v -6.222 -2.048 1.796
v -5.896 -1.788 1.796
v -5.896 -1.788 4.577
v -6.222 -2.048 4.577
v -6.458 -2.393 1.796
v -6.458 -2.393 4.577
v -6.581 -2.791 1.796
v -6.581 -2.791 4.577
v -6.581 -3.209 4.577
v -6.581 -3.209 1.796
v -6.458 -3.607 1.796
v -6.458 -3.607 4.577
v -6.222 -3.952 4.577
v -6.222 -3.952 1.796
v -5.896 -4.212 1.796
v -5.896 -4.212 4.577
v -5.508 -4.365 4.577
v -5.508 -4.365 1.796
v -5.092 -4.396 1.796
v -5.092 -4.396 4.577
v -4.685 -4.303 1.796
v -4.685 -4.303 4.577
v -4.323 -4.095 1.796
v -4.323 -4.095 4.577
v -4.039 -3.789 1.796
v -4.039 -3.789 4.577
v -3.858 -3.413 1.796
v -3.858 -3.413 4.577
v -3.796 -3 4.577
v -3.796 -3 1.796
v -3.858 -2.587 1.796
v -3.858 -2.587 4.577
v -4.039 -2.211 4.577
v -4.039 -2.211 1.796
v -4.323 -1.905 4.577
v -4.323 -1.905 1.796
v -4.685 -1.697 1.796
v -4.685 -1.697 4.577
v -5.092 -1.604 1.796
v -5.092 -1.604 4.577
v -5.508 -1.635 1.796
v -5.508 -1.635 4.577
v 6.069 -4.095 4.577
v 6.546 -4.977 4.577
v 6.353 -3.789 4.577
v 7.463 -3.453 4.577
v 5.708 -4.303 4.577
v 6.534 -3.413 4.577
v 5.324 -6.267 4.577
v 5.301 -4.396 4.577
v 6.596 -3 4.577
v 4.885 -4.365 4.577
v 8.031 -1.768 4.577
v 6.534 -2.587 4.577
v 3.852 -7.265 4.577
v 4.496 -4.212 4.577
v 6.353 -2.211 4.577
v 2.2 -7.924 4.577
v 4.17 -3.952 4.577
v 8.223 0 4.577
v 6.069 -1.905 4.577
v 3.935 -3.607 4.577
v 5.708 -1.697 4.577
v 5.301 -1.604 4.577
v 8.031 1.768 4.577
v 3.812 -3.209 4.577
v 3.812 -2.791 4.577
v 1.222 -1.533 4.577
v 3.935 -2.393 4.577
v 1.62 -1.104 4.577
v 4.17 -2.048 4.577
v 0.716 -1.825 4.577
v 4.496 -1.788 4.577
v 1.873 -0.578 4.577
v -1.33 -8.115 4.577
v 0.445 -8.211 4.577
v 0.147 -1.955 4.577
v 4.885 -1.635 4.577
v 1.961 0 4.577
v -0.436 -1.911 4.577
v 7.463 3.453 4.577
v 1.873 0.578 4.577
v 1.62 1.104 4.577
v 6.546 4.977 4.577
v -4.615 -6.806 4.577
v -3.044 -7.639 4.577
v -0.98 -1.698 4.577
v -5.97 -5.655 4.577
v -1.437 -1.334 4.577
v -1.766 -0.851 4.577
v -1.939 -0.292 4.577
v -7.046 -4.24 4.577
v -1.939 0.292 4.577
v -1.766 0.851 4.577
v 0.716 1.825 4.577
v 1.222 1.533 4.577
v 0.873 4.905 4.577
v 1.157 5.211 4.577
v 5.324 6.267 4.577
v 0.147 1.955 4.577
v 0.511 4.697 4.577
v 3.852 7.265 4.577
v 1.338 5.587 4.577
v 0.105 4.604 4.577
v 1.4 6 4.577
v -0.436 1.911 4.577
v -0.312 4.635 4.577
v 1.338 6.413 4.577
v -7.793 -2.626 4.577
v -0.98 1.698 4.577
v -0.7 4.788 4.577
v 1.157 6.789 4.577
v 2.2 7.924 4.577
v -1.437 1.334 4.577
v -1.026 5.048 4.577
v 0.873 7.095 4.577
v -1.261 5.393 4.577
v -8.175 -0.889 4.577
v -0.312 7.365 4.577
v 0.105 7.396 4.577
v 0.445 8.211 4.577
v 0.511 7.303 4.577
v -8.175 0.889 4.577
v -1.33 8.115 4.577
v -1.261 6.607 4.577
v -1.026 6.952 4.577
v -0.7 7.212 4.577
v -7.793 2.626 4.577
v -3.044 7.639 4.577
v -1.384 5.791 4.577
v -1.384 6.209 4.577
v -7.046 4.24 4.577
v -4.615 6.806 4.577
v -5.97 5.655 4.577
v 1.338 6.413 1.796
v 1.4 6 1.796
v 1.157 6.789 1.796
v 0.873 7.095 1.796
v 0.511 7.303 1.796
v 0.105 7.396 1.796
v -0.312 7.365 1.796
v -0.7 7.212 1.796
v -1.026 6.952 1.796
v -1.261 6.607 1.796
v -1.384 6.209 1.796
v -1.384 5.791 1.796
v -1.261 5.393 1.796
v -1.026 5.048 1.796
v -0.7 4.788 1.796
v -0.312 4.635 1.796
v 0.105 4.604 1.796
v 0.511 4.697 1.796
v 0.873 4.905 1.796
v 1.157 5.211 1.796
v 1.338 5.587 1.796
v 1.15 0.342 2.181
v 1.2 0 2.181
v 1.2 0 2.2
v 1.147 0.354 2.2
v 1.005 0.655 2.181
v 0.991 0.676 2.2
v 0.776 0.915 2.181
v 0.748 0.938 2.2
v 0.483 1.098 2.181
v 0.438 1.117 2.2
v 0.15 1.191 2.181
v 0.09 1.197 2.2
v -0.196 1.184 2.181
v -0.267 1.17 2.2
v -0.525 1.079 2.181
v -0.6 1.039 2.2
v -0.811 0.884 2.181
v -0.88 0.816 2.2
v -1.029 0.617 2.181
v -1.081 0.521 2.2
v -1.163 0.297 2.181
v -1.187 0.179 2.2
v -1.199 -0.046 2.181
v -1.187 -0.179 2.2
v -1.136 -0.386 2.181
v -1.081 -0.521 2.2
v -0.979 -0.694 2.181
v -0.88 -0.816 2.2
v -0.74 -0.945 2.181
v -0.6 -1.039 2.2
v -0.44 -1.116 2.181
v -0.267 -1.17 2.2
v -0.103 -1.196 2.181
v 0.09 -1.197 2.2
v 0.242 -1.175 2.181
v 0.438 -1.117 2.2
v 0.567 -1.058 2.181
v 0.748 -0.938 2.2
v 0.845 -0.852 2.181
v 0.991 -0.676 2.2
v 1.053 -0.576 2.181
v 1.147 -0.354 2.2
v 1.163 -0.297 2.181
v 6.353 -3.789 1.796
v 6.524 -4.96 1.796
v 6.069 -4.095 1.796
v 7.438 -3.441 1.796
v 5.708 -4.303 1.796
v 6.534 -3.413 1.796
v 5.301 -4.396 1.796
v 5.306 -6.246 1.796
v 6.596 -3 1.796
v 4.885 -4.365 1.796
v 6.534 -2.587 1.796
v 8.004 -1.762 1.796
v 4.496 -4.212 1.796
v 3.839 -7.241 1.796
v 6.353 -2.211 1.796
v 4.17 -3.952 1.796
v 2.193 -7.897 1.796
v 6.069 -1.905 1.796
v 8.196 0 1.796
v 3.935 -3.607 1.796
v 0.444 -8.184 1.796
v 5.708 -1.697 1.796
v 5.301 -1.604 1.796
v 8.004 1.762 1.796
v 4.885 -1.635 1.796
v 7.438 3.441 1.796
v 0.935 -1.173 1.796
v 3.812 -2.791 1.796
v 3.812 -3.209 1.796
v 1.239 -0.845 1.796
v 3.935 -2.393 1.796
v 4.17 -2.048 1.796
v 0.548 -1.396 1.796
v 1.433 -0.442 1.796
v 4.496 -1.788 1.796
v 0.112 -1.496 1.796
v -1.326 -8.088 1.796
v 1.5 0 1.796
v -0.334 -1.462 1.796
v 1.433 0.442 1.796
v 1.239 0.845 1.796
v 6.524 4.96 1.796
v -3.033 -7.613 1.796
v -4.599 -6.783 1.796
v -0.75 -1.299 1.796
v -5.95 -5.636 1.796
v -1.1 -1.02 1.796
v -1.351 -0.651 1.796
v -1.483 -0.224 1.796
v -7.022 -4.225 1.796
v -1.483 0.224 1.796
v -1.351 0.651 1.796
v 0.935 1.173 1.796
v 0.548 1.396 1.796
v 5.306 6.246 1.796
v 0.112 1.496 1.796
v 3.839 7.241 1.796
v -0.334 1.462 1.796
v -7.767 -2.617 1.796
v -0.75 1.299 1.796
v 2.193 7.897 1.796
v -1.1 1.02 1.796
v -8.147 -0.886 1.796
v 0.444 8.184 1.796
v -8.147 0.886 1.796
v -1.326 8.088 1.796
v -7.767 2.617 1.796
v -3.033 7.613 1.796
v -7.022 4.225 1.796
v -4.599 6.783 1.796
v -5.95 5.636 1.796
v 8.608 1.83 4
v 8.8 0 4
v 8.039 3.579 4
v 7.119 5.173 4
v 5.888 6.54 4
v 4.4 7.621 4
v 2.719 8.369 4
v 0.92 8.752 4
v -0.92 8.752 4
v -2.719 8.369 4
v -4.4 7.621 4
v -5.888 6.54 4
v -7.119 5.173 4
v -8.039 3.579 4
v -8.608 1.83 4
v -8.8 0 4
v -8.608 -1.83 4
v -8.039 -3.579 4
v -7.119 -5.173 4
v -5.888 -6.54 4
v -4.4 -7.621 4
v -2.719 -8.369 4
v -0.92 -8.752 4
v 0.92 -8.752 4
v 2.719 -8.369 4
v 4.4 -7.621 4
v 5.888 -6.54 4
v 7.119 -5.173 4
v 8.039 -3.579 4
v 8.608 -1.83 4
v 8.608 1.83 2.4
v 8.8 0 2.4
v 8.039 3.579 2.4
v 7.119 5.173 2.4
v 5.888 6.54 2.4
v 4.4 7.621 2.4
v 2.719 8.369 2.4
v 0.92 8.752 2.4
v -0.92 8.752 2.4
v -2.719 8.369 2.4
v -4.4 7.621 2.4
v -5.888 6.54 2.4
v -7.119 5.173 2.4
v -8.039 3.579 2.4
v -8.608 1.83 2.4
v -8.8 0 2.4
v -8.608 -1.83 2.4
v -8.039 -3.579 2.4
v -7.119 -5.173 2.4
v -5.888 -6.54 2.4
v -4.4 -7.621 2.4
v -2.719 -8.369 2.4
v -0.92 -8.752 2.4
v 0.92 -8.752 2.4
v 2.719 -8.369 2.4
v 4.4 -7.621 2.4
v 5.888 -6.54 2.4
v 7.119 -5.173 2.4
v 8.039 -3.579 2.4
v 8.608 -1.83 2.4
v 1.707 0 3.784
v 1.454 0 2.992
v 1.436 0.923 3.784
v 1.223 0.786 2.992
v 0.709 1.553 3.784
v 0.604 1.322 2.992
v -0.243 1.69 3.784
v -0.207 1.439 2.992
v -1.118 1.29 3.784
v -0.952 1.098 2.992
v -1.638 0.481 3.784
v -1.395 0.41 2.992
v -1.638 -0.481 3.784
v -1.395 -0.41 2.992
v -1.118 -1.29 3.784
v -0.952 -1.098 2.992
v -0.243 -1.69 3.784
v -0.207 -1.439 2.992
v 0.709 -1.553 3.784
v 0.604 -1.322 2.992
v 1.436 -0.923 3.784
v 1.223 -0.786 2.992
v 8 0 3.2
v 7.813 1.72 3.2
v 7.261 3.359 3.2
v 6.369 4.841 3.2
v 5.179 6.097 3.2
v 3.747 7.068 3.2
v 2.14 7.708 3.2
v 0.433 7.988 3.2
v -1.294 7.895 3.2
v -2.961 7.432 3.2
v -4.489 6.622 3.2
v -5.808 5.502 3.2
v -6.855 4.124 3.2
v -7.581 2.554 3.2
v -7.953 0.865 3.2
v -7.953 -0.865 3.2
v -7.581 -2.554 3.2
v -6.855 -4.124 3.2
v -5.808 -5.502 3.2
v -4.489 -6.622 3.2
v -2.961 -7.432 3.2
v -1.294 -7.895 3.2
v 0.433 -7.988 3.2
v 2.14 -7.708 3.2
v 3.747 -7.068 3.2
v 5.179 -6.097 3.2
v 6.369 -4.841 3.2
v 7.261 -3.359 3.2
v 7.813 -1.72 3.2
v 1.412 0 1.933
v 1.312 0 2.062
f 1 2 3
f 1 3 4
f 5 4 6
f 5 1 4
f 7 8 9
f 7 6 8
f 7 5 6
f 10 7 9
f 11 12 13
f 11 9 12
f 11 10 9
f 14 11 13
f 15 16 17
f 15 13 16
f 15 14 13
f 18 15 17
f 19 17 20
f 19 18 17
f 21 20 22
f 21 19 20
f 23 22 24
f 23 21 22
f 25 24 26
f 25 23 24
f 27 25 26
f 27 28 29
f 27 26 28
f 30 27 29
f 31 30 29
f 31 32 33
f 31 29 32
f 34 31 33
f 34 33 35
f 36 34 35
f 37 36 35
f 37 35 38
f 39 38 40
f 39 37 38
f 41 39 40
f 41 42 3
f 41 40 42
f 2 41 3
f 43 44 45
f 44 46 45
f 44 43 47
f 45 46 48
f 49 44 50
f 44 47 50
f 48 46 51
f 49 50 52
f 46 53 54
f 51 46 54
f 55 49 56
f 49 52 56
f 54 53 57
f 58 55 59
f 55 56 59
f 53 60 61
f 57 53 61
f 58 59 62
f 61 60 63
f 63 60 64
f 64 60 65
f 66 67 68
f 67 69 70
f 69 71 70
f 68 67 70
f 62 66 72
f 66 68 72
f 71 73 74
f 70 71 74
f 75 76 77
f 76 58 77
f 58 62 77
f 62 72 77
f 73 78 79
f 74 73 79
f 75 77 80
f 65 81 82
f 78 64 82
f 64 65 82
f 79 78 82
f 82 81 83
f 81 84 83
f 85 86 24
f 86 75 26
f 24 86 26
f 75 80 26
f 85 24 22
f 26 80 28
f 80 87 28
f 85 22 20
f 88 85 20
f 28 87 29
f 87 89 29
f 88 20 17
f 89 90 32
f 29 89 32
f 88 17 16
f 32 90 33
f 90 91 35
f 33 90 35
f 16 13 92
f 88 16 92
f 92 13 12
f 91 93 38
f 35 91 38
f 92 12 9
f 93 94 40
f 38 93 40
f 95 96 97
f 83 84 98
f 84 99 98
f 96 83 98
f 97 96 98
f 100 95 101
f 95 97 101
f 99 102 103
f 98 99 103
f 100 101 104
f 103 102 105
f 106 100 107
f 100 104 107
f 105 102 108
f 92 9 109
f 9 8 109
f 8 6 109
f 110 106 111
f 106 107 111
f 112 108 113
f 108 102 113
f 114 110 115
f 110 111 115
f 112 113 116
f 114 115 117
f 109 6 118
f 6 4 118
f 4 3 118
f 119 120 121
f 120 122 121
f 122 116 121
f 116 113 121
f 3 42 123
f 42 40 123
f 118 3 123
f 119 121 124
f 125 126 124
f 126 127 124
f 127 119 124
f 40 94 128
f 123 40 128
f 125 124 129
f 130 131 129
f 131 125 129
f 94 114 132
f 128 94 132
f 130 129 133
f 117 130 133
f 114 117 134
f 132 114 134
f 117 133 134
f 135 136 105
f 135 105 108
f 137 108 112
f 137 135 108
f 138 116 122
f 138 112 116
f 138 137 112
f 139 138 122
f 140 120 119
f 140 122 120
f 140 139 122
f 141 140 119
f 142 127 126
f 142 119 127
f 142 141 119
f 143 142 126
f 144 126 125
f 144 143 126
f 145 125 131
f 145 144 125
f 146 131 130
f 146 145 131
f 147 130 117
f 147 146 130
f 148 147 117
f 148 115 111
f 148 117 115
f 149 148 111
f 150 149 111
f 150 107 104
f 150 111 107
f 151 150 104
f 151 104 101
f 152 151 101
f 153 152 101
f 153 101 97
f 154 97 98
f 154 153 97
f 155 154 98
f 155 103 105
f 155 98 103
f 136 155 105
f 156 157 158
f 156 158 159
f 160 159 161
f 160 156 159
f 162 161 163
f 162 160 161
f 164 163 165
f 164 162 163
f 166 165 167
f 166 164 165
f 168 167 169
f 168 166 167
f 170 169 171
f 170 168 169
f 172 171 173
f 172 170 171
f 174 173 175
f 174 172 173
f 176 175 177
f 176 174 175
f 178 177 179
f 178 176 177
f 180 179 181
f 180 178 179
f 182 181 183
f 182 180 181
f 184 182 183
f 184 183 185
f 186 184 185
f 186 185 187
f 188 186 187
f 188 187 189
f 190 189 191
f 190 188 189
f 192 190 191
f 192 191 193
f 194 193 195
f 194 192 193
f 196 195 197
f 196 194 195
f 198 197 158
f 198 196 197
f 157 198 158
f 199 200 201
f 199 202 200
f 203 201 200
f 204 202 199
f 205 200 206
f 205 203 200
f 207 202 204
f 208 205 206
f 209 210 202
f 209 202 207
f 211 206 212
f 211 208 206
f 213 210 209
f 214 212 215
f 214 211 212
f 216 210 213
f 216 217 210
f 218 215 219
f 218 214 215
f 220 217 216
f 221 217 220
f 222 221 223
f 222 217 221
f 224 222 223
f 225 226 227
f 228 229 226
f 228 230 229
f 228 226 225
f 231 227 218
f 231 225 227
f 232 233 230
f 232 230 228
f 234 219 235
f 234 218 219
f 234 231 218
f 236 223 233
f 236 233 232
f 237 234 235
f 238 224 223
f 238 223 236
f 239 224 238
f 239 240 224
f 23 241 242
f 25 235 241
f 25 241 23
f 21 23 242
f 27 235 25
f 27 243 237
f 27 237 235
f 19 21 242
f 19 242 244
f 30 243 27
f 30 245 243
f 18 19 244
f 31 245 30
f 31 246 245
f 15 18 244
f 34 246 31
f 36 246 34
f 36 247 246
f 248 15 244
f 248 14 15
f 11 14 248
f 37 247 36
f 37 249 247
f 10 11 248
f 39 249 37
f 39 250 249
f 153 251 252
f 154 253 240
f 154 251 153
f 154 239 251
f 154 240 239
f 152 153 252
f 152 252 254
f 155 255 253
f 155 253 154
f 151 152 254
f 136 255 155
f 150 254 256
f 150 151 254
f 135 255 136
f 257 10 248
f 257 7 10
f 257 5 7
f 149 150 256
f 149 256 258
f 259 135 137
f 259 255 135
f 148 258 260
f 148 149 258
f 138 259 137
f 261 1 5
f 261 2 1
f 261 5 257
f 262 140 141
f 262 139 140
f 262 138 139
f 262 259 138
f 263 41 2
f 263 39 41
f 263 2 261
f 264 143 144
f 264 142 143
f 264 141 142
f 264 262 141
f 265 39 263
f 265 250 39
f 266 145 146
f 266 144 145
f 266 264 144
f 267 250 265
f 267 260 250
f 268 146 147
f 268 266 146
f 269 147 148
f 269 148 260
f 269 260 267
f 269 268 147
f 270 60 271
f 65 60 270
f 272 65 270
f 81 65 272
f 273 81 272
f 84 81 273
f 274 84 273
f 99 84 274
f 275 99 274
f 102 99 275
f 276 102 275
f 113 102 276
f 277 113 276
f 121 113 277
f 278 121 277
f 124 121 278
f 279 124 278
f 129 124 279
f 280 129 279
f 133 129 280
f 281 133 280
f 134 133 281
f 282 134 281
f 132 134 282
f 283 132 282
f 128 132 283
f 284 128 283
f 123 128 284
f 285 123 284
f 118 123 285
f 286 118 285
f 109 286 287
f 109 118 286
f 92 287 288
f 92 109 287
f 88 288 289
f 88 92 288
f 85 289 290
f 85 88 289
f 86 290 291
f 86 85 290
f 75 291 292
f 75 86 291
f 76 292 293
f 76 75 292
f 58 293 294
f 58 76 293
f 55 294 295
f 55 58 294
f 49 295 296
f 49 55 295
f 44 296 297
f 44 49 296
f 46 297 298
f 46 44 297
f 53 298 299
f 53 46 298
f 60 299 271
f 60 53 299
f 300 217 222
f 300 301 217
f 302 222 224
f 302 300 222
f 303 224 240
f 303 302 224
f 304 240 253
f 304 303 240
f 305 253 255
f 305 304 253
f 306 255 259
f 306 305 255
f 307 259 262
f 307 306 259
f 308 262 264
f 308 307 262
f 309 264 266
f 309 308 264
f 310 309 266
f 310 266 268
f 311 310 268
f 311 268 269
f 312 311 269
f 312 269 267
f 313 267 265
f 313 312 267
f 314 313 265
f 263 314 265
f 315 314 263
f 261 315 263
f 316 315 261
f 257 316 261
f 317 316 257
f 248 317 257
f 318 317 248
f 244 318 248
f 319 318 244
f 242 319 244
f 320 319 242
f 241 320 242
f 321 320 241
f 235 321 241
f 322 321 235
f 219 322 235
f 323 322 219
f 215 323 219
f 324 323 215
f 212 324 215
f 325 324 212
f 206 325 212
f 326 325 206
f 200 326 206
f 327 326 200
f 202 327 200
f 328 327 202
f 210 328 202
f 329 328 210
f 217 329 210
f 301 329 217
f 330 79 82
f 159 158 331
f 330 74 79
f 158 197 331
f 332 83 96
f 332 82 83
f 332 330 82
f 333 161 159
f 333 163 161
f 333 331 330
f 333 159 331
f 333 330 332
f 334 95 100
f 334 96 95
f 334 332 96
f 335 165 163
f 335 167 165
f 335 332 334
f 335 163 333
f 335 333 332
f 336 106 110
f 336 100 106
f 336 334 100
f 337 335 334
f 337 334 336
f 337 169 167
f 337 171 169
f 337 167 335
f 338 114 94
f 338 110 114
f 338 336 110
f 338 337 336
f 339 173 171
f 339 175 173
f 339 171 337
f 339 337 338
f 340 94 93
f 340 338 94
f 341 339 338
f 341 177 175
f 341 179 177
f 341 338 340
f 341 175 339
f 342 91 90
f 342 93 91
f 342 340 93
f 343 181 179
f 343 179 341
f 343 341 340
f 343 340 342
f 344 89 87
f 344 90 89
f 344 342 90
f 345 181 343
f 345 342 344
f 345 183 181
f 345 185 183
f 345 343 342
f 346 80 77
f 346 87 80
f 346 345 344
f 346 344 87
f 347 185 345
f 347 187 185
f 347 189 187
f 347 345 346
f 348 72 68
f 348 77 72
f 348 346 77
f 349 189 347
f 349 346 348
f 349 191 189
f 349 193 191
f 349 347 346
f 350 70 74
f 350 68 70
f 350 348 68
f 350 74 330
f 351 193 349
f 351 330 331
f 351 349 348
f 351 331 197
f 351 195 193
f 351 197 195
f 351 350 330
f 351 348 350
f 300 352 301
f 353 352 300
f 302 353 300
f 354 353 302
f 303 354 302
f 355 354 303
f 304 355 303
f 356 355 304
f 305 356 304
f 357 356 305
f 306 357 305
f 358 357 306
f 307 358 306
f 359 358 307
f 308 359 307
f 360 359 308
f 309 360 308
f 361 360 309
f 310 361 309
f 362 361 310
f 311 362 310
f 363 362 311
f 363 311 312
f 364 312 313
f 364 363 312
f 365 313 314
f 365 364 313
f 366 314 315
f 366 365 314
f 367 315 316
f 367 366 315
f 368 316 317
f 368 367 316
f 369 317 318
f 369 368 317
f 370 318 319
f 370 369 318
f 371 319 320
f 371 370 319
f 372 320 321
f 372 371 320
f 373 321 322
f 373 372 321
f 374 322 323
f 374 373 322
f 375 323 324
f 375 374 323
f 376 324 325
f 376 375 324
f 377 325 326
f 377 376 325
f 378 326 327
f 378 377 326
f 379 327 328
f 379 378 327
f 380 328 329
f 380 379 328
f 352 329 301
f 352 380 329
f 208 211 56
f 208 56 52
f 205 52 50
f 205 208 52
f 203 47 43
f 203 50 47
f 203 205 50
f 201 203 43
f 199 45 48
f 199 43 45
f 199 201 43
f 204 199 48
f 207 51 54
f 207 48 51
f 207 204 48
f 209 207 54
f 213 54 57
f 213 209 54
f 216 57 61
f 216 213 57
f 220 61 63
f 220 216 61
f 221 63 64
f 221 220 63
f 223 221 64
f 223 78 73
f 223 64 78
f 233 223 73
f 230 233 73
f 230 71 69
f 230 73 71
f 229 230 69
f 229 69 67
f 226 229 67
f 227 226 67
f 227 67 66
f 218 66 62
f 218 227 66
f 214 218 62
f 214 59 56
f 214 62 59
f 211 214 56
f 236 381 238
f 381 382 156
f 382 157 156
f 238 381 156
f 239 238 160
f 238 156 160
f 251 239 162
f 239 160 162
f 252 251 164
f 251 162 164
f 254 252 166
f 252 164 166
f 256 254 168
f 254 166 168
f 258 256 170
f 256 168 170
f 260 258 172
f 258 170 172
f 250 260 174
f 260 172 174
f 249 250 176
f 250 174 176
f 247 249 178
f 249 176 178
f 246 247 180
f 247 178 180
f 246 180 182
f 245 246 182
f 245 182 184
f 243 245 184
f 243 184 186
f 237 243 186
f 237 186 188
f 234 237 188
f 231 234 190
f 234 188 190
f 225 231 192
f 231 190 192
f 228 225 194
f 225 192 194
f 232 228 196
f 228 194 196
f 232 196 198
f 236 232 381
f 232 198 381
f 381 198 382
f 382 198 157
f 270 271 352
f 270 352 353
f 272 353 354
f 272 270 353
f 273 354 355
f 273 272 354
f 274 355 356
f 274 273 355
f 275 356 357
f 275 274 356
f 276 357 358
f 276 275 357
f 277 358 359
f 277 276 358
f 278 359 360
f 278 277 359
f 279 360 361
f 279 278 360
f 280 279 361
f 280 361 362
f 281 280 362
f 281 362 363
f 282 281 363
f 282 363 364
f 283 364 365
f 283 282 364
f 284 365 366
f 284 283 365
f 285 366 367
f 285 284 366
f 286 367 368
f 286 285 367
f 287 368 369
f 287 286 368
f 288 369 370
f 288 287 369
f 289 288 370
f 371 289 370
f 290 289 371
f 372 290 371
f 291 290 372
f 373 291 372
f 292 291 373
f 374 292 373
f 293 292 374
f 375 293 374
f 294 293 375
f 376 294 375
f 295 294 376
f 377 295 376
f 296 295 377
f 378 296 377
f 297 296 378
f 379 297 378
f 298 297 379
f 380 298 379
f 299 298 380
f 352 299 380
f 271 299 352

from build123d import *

# Parameters (mm, degrees)
SKETCH019_W    = 10
SKETCH019_H    = 2.7812096768
SKETCH005_W    = 10
SKETCH005_H    = 2.2955317108
CYLINDER_R     = 1.4
CYLINDER_DEPTH = 10
ARRAY001_COUNT = 3
SKETCH018_W    = 3.15
SKETCH018_H    = 2.3
SKETCH002_W    = 5
SKETCH002_H    = 6.8
ARRAY_Z_COUNT  = 6
ARRAY_Z_PITCH  = 1.6


with BuildPart() as middledom001:
    # Sketch019 → Revolution008 (revolve)
    with BuildSketch(Plane.XZ):
        with Locations((5, 3.1861365492)):
            Rectangle(SKETCH019_W, SKETCH019_H)
    revolve(axis=Axis((0, 0, 0), (0, 0, 1)))


with BuildPart() as clone_of_lowerdomain001:
    # Sketch005 → Revolution004 (revolve)
    with BuildSketch(Plane.XZ):
        with Locations((5, 0.6477658554)):
            Rectangle(SKETCH005_W, SKETCH005_H)
    revolve(axis=Axis((0, 0, 0), (0, 0, 1)))


with BuildPart() as boltholes:
    # Cylinder → Cylinder (new body)
    with BuildSketch(Plane(origin=(0, 6, -1), x_dir=(1, 0, 0), z_dir=(0, 0, 1))):
        Circle(CYLINDER_R)
    extrude(amount=CYLINDER_DEPTH)

    # Array001: BoltHoles ×3 about axis
    array001_axis = Axis((0, 0, 0), (0, 0, 1))


with BuildPart() as boltholes_1:
    add(boltholes.part)
    for i in range(1, ARRAY001_COUNT):
        add(boltholes.part.rotate(array001_axis, i * 360 / ARRAY001_COUNT))


with BuildPart() as ps2long001:
    # Sketch018 → Revolution007 (revolve)
    with BuildSketch(Plane.XZ):
        with Locations((1.575, 5.7267413876)):
            Rectangle(SKETCH018_W, SKETCH018_H)
    revolve(axis=Axis((0, 0, 0), (0, 0, 1)))


with BuildPart() as clone_of_laq:
    # Sketch007 → Revolution006 (revolve)
    with BuildSketch(Plane.XZ):
        with BuildLine():
            ThreePointArc((1.5, 1.7955317108), (0.867020761, 2.4322916436), (0, 2.6655317108))
            Line((0, 2.6655317108), (0, 0.7955317108))
            Line((0, 0.7955317108), (1.5, 0.7955317108))
            Line((1.5, 1.7955317108), (1.5, 0.7955317108))
        make_face()
    revolve(axis=Axis((0, 0, 0), (0, 0, 1)))


with BuildPart() as innergroovedom001:
    # Sketch002 → Revolution002 (revolve)
    with BuildSketch(Plane.XZ):
        with Locations((7.5, 3.8)):
            Rectangle(SKETCH002_W, SKETCH002_H)
    revolve(axis=Axis((0, 0, 0), (0, 0, 1)))


with BuildPart() as innergroovetool:
    # Sketch001 → Revolution001 (revolve)
    with BuildSketch(Plane.XZ):
        Polygon((4, 8), (4, 6.4), (8, 6.4), (8.8, 7.2), (8, 8), align=None)
    revolve(axis=Axis((0, 0, 0), (0, 0, 1)))

    # Array Z: InnerGrooveTool ×6


with BuildPart() as innergroovetool_1:
    add(innergroovetool.part)
    with Locations(*[(0, 0, -i * ARRAY_Z_PITCH) for i in range(1, ARRAY_Z_COUNT)]):
        add(innergroovetool.part)

    # Common: intersect InnerGrooveDom001
    add(innergroovedom001.part, mode=Mode.INTERSECT)


with BuildPart() as refine_middlecommon:
    # Sketch → Revolution (revolve)
    with BuildSketch(Plane.XZ):
        Polygon((1.2, 0.4), (8, 0.4), (8, 7.2), (2.8, 7.2), (1.2, 2.2), align=None)
    revolve(axis=Axis((0, 0, 0), (0, 0, 1)))

    # Fusion001: union InnerGrooveTool
    add(innergroovetool_1.part)

    # Cut: cut Clone of LAQ
    add(clone_of_laq.part, mode=Mode.SUBTRACT)

    # Cut003: cut PS2Long001
    add(ps2long001.part, mode=Mode.SUBTRACT)

    # Cut001: cut BoltHoles
    add(boltholes_1.part, mode=Mode.SUBTRACT)

    # Cut002: cut Clone of LowerDomain001
    add(clone_of_lowerdomain001.part, mode=Mode.SUBTRACT)

    # Common002: intersect MiddleDom001
    add(middledom001.part, mode=Mode.INTERSECT)


solid = refine_middlecommon.part
